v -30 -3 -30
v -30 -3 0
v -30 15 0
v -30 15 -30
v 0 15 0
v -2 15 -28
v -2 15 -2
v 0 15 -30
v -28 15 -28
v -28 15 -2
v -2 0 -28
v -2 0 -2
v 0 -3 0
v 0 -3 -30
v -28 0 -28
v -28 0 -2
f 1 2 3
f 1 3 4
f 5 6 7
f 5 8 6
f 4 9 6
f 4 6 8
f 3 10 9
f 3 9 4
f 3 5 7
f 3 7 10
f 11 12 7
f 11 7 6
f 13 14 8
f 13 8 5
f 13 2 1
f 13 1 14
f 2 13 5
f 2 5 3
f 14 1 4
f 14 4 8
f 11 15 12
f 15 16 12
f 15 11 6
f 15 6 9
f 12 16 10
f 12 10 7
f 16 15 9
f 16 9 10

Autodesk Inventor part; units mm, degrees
ref_plane "YZ Plane" through (0, 0, 0) normal (1, 0, 0) x (0, 1, 0)
ref_plane "XZ Plane" through (0, 0, 0) normal (0, 1, 0) x (-1, 0, 0)
ref_plane "XY Plane" through (0, 0, 0) normal (0, 0, 1) x (1, 0, 0)
sketch "Sketch1" plane through (0, 0, 0) normal (0, 1, 0) x (-1, 0, 0)
  line L0 (0, 0) -> (30, 0)
  line L1 (30, 0) -> (30, -30)
  line L2 (30, -30) -> (0, -30)
  line L3 (0, -30) -> (0, 0)
  line L4 (28, -2) -> (2, -2)
  line L5 (2, -2) -> (2, -28)
  line L6 (2, -28) -> (28, -28)
  line L7 (28, -28) -> (28, -2)
  point P0 (0, -15)
  point P1 (2, -15)
  dimension "d0" = 30
  dimension "d1" = 30
  dimension "d2" = 2
  dimension "d3" = 2
  dimension "d4" = 2
  dimension "d5" = 2
extrude "Extrusion1" add sketch "Sketch1" along normal blind 15
sketch "Sketch2" plane through (0, 0, 0) normal (0, -1, 0) x (1, 0, 0)
  line L0 (-30, 0) -> (0, 0) projected
  line L1 (0, -30) -> (-30, -30) projected
  line L2 (-30, 0) -> (0, 0)
  line L3 (0, 0) -> (0, -30)
  line L4 (0, -30) -> (-30, -30)
  line L5 (-30, -30) -> (-30, 0)
extrude "Extrusion2" add sketch "Sketch2" along normal blind 3
properties part number "Boks_3DPrint"
